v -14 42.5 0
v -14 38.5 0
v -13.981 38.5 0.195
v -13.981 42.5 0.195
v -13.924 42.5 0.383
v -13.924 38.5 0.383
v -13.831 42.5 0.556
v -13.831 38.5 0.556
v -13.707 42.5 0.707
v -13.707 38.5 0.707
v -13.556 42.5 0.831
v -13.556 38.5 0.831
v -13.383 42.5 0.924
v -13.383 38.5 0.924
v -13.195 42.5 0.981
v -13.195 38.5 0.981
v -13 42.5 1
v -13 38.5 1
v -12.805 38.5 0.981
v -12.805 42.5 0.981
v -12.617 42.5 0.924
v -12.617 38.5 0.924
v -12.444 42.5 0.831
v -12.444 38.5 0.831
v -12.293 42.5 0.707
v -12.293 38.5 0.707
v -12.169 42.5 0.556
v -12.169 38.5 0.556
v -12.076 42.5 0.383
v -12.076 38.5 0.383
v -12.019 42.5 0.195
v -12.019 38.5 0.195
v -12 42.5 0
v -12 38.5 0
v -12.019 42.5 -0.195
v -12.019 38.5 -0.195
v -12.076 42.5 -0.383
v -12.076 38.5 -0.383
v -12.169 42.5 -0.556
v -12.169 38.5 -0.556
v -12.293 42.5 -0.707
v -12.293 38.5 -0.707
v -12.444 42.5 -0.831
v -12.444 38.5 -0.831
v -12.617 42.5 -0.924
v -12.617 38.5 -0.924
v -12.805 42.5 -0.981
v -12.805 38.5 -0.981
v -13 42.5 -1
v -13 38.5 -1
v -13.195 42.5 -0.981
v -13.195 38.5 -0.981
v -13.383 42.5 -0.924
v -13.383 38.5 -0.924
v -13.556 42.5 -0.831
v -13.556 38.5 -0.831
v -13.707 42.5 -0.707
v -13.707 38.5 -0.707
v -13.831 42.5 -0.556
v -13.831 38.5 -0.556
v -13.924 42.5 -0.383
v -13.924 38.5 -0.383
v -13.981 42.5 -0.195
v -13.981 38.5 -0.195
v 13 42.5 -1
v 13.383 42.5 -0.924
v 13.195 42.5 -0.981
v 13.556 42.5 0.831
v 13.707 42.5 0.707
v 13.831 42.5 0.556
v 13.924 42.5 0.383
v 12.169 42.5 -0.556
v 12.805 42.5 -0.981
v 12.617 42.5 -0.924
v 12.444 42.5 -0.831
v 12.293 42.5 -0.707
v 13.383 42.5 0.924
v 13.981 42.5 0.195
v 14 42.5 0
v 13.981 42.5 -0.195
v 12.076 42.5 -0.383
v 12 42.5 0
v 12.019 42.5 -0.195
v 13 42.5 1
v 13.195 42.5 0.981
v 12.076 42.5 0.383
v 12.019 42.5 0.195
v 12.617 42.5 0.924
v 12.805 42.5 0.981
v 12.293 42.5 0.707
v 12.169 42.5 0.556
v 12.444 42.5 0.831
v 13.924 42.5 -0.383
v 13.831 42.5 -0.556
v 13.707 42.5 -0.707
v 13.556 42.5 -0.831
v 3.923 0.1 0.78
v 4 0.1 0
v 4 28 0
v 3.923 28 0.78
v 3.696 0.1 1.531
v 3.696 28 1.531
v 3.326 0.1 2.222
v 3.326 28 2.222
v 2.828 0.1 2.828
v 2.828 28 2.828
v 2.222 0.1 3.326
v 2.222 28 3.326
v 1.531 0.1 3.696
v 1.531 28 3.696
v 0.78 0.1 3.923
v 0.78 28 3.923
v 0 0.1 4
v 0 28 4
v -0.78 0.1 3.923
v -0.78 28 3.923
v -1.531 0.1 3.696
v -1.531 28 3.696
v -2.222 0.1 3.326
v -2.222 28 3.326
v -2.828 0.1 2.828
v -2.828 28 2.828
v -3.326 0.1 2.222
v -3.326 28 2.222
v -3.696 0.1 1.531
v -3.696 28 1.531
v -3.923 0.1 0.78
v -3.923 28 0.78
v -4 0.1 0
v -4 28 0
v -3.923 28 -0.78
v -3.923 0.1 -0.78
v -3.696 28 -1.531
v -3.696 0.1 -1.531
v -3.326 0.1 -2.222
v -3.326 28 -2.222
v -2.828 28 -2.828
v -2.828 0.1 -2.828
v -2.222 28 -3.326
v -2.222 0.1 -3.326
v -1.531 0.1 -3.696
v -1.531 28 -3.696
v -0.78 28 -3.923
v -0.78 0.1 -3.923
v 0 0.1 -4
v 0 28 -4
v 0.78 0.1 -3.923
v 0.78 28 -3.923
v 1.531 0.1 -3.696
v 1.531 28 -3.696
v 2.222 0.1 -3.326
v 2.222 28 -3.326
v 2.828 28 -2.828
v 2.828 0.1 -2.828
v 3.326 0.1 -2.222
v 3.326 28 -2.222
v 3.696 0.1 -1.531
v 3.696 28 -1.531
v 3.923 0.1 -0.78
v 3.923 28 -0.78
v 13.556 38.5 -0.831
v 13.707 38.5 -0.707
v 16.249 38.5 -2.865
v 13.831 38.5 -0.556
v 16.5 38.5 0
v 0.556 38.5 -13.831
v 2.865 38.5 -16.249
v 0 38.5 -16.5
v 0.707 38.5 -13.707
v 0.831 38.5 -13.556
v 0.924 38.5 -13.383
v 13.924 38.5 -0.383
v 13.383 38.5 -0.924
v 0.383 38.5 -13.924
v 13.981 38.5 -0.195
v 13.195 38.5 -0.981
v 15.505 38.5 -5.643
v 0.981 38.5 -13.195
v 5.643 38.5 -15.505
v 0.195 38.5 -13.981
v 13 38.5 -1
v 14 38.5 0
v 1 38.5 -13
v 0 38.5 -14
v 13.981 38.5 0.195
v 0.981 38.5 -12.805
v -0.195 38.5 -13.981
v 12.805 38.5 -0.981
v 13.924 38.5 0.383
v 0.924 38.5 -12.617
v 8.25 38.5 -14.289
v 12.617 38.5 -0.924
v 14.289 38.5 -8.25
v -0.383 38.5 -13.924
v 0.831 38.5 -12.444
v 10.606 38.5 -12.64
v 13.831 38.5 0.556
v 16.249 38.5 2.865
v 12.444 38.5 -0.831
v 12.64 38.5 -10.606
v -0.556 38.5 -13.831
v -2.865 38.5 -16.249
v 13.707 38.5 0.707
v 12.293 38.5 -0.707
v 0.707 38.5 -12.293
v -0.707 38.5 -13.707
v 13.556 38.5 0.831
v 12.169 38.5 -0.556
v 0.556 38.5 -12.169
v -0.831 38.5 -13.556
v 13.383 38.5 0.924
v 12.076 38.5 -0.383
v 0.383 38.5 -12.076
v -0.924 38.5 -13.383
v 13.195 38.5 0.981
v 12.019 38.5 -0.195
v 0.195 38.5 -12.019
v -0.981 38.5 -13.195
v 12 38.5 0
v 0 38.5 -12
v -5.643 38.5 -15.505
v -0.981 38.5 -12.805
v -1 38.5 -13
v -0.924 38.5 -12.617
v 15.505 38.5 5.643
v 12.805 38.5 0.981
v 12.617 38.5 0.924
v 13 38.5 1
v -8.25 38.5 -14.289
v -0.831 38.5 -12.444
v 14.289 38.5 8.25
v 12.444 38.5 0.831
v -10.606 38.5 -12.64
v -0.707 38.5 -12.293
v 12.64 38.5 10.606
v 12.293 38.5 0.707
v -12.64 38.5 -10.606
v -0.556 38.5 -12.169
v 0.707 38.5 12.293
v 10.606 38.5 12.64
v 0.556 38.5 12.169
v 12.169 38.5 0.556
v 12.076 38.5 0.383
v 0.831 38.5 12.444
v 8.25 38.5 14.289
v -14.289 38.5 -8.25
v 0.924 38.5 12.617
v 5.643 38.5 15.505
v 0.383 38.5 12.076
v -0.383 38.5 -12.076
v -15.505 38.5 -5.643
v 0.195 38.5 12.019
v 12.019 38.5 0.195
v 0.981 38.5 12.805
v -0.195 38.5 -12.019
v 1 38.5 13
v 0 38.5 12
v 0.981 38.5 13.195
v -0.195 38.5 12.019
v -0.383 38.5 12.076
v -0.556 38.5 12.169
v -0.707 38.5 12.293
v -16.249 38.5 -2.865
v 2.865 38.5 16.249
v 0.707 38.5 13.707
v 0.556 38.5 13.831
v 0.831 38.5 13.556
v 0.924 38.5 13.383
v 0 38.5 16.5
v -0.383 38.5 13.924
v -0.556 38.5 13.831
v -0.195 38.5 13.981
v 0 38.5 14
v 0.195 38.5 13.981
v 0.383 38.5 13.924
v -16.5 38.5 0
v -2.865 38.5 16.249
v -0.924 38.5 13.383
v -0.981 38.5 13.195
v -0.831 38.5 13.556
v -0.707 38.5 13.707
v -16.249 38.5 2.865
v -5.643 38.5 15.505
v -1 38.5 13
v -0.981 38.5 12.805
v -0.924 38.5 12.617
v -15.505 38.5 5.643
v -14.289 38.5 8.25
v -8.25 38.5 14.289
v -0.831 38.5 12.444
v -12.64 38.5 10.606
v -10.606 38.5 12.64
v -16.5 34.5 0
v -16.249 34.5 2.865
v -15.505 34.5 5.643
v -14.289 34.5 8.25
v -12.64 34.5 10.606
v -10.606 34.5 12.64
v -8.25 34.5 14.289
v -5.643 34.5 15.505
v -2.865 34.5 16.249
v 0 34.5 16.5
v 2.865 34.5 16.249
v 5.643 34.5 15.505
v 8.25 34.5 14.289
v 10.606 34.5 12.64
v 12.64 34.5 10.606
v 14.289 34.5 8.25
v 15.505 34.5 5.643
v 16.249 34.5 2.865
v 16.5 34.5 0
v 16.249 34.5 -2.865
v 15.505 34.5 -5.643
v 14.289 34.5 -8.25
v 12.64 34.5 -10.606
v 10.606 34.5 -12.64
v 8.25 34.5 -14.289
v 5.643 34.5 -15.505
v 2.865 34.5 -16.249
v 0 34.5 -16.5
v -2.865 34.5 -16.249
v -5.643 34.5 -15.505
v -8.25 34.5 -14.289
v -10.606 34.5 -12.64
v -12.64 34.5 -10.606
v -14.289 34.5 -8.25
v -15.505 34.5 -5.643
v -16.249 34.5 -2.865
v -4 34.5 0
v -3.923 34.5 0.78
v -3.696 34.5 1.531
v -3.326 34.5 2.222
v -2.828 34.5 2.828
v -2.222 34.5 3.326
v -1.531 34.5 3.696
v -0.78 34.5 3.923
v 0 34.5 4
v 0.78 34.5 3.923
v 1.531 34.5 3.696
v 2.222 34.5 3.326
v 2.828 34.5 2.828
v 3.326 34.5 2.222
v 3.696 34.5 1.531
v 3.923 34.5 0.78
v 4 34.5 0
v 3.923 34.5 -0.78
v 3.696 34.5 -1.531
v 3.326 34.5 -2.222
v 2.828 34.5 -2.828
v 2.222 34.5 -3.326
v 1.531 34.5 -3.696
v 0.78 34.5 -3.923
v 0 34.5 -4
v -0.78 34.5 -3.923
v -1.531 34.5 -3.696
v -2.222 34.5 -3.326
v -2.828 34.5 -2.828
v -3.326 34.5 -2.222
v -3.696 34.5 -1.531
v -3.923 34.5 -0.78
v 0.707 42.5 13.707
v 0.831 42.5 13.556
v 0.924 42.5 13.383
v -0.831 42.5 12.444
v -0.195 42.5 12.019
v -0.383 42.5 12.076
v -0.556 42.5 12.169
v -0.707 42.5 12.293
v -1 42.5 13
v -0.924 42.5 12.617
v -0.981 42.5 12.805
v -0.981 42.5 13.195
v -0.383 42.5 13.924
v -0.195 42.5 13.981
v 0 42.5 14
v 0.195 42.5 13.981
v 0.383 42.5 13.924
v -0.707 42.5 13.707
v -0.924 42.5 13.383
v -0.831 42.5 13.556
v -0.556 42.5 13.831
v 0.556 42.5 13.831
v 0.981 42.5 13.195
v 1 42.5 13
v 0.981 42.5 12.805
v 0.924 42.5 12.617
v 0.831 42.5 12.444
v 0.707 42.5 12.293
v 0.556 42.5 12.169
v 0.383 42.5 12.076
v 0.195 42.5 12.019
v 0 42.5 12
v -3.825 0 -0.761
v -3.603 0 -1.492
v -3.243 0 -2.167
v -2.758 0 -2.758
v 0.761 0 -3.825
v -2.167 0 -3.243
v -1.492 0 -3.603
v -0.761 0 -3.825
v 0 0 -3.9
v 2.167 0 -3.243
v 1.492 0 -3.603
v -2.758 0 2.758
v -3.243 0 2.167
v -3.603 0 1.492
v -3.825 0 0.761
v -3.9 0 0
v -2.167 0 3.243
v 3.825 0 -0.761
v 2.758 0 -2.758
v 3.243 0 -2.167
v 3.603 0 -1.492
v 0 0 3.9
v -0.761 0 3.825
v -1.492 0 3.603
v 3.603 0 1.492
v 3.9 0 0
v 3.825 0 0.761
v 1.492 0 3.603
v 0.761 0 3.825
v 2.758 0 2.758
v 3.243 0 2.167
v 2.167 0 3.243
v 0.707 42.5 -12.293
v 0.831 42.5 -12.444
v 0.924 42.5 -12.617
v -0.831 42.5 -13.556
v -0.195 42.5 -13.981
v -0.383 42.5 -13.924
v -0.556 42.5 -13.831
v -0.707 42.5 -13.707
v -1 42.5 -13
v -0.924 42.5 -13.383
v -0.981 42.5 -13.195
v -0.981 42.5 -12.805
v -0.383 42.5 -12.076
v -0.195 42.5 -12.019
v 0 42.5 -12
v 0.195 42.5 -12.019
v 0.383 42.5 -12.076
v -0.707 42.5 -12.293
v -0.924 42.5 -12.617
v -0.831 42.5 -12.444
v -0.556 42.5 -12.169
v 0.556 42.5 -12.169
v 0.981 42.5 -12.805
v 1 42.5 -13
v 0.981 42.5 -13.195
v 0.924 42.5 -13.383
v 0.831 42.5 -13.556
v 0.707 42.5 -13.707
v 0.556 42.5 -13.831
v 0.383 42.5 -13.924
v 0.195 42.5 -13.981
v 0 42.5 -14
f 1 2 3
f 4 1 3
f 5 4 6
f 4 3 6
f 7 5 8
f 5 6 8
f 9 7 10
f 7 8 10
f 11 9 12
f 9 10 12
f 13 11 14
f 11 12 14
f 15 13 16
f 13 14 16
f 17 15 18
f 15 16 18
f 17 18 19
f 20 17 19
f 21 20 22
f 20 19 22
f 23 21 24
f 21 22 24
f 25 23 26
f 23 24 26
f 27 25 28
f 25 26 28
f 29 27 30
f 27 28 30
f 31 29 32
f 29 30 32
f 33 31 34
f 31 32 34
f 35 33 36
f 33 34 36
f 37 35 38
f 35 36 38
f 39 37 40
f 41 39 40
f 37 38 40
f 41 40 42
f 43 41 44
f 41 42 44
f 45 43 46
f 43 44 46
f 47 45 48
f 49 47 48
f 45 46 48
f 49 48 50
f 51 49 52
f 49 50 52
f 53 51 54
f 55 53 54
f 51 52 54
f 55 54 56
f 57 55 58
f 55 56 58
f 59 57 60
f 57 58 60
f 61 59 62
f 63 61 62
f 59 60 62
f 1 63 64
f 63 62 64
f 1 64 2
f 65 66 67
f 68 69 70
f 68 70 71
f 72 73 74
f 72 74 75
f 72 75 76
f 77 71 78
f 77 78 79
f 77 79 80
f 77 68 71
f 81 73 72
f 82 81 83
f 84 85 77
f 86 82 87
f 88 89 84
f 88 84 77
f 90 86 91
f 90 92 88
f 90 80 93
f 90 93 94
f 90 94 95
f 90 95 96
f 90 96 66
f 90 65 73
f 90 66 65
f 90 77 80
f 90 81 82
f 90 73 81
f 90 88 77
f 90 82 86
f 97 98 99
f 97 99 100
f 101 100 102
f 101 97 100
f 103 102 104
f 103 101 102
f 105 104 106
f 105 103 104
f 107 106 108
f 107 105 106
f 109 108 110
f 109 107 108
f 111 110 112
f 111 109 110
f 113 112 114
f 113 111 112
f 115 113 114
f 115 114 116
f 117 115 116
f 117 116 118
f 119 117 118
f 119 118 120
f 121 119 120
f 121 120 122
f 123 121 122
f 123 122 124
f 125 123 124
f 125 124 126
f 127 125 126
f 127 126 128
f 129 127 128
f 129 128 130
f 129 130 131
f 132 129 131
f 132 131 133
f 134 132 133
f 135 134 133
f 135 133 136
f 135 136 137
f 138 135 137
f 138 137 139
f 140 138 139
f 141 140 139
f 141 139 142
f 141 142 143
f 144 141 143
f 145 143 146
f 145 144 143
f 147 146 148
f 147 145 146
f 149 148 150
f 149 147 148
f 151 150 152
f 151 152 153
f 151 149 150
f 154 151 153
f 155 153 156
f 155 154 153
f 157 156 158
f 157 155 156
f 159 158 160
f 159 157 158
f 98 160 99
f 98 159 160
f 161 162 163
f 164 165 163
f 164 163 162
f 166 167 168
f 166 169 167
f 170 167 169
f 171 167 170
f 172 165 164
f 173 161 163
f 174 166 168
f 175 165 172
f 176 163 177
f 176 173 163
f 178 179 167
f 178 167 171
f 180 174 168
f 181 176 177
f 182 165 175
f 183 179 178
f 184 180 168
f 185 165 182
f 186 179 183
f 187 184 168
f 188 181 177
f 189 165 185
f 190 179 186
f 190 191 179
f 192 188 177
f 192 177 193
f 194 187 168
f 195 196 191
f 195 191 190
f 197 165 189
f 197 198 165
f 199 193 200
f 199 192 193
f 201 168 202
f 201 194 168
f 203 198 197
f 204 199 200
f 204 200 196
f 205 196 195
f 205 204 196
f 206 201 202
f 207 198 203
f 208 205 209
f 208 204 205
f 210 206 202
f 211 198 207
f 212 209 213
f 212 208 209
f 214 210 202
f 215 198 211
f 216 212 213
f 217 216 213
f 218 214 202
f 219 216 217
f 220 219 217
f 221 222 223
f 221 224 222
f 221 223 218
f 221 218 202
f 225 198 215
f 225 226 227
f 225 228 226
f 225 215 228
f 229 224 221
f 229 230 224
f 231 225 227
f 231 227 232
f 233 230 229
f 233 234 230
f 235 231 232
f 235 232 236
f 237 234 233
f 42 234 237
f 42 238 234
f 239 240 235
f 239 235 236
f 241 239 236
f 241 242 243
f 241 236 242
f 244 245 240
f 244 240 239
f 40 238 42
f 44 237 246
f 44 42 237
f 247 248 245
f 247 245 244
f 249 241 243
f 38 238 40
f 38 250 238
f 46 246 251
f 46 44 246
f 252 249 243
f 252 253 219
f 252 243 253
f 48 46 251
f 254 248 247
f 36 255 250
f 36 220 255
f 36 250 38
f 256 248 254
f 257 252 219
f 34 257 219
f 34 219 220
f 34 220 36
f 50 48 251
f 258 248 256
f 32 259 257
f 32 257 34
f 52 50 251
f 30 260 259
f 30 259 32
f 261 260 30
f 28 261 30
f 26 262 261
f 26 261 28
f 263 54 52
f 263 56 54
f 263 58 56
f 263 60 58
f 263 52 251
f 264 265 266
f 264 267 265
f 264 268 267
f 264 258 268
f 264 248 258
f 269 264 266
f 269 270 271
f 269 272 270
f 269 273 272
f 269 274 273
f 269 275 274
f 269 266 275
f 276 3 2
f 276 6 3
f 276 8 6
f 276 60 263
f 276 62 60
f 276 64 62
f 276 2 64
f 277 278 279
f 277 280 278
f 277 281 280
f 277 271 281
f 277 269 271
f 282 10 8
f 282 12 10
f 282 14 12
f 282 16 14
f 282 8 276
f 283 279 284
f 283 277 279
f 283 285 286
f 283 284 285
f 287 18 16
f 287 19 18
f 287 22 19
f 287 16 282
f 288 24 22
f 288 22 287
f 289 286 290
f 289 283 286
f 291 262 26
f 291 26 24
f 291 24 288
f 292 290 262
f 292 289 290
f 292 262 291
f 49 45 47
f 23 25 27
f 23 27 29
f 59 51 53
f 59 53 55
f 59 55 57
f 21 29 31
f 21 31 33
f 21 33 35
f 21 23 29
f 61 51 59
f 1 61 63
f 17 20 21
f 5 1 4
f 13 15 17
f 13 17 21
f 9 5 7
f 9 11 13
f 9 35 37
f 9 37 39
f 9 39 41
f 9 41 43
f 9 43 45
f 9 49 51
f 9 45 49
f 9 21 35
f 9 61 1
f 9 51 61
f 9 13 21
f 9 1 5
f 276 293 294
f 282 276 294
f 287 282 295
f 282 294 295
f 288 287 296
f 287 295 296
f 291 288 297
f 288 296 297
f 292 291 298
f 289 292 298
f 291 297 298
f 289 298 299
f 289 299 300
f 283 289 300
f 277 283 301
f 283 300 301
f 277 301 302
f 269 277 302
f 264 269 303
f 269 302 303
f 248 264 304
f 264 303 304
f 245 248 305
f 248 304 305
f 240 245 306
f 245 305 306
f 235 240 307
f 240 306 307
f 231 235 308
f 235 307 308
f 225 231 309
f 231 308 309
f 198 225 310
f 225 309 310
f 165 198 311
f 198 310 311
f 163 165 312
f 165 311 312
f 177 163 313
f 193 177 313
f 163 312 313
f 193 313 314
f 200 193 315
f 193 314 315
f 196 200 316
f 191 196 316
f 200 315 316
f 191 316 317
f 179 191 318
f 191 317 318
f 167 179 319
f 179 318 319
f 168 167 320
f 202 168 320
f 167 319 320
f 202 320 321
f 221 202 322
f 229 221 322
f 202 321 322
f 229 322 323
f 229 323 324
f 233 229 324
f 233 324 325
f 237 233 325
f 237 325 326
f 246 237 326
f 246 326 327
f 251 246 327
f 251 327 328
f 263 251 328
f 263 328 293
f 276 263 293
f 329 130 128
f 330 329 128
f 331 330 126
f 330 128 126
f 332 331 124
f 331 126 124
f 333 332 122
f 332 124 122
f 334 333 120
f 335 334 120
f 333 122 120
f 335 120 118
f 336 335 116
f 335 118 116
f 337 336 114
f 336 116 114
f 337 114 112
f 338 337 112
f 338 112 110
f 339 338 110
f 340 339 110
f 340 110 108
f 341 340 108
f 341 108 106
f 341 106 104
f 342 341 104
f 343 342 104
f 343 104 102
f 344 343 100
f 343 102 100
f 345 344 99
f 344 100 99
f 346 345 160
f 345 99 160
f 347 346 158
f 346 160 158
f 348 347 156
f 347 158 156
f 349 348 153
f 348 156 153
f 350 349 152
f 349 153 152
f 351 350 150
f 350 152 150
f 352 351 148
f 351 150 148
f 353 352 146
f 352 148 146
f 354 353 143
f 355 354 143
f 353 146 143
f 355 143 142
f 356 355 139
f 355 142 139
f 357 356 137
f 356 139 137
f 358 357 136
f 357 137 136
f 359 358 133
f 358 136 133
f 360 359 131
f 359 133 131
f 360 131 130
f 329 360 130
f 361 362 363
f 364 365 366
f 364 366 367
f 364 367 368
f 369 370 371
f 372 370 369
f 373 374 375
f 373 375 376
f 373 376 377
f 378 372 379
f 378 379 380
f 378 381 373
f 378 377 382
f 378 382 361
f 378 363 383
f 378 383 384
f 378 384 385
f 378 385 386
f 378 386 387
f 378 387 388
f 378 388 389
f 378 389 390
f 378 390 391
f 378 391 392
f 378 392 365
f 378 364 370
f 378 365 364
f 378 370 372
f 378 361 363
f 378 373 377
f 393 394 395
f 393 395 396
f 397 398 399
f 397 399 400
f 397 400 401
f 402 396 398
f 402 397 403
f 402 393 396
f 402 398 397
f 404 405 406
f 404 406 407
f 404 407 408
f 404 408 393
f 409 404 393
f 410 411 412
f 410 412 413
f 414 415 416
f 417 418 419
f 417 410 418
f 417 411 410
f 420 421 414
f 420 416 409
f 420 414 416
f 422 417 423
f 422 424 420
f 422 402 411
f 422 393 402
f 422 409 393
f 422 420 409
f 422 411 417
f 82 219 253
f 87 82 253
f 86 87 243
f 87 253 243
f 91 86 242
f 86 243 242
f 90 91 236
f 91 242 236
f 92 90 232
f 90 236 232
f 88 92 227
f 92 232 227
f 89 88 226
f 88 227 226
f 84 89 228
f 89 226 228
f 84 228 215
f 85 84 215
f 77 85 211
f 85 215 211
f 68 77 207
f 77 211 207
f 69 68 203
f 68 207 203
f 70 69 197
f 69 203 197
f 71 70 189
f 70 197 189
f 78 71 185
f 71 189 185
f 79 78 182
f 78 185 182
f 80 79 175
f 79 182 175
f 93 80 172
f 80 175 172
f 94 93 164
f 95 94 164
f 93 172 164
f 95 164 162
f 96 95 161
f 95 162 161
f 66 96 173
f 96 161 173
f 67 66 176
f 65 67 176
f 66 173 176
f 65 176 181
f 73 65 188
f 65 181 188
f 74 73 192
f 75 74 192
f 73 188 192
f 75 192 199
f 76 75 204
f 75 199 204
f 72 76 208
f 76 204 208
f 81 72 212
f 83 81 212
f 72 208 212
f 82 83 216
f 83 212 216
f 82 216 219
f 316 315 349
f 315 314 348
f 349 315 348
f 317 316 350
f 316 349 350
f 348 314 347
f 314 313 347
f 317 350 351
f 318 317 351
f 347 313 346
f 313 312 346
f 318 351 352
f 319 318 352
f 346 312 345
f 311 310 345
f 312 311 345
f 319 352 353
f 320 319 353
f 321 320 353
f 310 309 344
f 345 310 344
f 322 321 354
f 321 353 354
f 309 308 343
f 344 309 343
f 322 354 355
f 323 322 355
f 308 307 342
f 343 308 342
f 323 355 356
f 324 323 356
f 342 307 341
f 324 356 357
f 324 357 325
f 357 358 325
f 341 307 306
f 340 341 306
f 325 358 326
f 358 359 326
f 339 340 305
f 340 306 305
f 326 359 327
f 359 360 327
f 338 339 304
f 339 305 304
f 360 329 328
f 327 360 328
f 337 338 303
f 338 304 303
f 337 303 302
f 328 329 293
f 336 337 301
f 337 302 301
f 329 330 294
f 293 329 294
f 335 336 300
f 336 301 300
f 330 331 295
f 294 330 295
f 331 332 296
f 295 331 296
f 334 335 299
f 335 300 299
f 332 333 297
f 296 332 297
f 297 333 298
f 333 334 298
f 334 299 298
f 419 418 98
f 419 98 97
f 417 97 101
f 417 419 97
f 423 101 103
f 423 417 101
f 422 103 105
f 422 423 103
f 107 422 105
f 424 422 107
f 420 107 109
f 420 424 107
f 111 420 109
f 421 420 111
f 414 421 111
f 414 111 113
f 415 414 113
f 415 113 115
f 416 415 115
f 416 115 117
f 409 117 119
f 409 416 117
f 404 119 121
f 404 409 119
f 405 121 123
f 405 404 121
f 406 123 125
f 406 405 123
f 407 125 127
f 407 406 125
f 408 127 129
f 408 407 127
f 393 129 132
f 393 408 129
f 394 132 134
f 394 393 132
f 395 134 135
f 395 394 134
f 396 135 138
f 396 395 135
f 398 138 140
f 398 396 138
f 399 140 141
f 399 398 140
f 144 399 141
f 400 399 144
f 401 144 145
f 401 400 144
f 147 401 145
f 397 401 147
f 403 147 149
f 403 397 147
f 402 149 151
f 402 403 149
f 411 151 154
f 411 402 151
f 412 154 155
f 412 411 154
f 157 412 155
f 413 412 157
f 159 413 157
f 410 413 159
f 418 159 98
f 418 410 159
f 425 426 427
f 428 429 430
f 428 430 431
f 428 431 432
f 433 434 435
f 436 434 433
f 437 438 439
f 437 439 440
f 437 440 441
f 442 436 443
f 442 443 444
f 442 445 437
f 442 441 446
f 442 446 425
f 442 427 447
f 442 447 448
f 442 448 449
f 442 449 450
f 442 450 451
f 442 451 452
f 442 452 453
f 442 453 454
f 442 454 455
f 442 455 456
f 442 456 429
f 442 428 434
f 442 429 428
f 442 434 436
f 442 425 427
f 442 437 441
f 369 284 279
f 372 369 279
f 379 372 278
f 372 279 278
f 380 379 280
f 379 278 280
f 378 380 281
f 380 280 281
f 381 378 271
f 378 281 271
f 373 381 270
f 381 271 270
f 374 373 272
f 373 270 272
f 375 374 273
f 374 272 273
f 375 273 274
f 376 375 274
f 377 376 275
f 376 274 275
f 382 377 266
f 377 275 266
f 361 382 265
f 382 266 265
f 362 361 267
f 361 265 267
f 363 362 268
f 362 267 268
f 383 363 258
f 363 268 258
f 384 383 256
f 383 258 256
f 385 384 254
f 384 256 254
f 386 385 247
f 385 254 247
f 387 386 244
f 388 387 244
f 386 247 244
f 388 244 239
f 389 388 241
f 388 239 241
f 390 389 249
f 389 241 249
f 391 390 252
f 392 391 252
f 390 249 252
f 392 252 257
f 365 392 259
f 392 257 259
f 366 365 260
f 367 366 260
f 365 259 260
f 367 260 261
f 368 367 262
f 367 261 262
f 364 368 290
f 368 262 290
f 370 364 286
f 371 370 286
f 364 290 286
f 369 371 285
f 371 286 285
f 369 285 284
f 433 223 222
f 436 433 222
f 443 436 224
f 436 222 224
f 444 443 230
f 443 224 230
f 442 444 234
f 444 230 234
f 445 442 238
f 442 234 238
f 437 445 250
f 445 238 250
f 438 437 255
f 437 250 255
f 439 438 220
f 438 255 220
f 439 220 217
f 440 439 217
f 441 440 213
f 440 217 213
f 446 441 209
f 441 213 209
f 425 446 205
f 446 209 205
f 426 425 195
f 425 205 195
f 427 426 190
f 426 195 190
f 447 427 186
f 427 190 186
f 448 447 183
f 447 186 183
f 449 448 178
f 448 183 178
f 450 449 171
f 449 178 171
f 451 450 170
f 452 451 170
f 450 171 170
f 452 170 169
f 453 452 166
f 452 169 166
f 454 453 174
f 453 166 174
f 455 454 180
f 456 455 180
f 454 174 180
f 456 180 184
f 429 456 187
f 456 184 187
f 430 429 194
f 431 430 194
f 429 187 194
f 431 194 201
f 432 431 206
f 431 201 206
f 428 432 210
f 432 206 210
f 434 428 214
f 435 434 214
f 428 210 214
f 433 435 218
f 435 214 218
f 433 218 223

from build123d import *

# Parameters (mm, degrees)
F0_R     = 4
F1_DEPTH = 28
F2_SIZE  = 0.1
F3_R     = 4
F4_DEPTH = 6.5
F5_R     = 16.5
F6_DEPTH = 4
F7_R     = 1
F8_DEPTH = 4


with BuildPart() as f1:
    # F0 (on Front) → F1 (new body)
    with BuildSketch(Plane.XZ):
        Circle(F0_R)
    extrude(amount=-F1_DEPTH)

    # F2
    f2_edges = [f1.edges().sort_by_distance(p)[0] for p in [
        (-4, 0, 0),
    ]]
    chamfer(f2_edges, length=F2_SIZE)

    # F3 (on face) → F4 (join)
    with BuildSketch(Plane(origin=(0, 28, 0), x_dir=(-1, 0, 0), z_dir=(0, 1, 0))):
        Circle(F3_R)
    extrude(amount=F4_DEPTH)

    # F5 (on face) → F6 (join)
    with BuildSketch(Plane(origin=(0, 34.5, 0), x_dir=(-1, 0, 0), z_dir=(0, 1, 0))):
        Circle(F5_R)
    extrude(amount=F6_DEPTH)

    # F7 (on face) → F8 (join)
    with BuildSketch(Plane(origin=(0, 38.5, 0), x_dir=(-1, 0, 0), z_dir=(0, 1, 0))):
        with Locations((0, 13)):
            Circle(F7_R)
        with Locations((-13, 0)):
            Circle(F7_R)
        with Locations((0, -13)):
            Circle(F7_R)
        with Locations((13, 0)):
            Circle(F7_R)
    extrude(amount=F8_DEPTH)


solid = f1.part
